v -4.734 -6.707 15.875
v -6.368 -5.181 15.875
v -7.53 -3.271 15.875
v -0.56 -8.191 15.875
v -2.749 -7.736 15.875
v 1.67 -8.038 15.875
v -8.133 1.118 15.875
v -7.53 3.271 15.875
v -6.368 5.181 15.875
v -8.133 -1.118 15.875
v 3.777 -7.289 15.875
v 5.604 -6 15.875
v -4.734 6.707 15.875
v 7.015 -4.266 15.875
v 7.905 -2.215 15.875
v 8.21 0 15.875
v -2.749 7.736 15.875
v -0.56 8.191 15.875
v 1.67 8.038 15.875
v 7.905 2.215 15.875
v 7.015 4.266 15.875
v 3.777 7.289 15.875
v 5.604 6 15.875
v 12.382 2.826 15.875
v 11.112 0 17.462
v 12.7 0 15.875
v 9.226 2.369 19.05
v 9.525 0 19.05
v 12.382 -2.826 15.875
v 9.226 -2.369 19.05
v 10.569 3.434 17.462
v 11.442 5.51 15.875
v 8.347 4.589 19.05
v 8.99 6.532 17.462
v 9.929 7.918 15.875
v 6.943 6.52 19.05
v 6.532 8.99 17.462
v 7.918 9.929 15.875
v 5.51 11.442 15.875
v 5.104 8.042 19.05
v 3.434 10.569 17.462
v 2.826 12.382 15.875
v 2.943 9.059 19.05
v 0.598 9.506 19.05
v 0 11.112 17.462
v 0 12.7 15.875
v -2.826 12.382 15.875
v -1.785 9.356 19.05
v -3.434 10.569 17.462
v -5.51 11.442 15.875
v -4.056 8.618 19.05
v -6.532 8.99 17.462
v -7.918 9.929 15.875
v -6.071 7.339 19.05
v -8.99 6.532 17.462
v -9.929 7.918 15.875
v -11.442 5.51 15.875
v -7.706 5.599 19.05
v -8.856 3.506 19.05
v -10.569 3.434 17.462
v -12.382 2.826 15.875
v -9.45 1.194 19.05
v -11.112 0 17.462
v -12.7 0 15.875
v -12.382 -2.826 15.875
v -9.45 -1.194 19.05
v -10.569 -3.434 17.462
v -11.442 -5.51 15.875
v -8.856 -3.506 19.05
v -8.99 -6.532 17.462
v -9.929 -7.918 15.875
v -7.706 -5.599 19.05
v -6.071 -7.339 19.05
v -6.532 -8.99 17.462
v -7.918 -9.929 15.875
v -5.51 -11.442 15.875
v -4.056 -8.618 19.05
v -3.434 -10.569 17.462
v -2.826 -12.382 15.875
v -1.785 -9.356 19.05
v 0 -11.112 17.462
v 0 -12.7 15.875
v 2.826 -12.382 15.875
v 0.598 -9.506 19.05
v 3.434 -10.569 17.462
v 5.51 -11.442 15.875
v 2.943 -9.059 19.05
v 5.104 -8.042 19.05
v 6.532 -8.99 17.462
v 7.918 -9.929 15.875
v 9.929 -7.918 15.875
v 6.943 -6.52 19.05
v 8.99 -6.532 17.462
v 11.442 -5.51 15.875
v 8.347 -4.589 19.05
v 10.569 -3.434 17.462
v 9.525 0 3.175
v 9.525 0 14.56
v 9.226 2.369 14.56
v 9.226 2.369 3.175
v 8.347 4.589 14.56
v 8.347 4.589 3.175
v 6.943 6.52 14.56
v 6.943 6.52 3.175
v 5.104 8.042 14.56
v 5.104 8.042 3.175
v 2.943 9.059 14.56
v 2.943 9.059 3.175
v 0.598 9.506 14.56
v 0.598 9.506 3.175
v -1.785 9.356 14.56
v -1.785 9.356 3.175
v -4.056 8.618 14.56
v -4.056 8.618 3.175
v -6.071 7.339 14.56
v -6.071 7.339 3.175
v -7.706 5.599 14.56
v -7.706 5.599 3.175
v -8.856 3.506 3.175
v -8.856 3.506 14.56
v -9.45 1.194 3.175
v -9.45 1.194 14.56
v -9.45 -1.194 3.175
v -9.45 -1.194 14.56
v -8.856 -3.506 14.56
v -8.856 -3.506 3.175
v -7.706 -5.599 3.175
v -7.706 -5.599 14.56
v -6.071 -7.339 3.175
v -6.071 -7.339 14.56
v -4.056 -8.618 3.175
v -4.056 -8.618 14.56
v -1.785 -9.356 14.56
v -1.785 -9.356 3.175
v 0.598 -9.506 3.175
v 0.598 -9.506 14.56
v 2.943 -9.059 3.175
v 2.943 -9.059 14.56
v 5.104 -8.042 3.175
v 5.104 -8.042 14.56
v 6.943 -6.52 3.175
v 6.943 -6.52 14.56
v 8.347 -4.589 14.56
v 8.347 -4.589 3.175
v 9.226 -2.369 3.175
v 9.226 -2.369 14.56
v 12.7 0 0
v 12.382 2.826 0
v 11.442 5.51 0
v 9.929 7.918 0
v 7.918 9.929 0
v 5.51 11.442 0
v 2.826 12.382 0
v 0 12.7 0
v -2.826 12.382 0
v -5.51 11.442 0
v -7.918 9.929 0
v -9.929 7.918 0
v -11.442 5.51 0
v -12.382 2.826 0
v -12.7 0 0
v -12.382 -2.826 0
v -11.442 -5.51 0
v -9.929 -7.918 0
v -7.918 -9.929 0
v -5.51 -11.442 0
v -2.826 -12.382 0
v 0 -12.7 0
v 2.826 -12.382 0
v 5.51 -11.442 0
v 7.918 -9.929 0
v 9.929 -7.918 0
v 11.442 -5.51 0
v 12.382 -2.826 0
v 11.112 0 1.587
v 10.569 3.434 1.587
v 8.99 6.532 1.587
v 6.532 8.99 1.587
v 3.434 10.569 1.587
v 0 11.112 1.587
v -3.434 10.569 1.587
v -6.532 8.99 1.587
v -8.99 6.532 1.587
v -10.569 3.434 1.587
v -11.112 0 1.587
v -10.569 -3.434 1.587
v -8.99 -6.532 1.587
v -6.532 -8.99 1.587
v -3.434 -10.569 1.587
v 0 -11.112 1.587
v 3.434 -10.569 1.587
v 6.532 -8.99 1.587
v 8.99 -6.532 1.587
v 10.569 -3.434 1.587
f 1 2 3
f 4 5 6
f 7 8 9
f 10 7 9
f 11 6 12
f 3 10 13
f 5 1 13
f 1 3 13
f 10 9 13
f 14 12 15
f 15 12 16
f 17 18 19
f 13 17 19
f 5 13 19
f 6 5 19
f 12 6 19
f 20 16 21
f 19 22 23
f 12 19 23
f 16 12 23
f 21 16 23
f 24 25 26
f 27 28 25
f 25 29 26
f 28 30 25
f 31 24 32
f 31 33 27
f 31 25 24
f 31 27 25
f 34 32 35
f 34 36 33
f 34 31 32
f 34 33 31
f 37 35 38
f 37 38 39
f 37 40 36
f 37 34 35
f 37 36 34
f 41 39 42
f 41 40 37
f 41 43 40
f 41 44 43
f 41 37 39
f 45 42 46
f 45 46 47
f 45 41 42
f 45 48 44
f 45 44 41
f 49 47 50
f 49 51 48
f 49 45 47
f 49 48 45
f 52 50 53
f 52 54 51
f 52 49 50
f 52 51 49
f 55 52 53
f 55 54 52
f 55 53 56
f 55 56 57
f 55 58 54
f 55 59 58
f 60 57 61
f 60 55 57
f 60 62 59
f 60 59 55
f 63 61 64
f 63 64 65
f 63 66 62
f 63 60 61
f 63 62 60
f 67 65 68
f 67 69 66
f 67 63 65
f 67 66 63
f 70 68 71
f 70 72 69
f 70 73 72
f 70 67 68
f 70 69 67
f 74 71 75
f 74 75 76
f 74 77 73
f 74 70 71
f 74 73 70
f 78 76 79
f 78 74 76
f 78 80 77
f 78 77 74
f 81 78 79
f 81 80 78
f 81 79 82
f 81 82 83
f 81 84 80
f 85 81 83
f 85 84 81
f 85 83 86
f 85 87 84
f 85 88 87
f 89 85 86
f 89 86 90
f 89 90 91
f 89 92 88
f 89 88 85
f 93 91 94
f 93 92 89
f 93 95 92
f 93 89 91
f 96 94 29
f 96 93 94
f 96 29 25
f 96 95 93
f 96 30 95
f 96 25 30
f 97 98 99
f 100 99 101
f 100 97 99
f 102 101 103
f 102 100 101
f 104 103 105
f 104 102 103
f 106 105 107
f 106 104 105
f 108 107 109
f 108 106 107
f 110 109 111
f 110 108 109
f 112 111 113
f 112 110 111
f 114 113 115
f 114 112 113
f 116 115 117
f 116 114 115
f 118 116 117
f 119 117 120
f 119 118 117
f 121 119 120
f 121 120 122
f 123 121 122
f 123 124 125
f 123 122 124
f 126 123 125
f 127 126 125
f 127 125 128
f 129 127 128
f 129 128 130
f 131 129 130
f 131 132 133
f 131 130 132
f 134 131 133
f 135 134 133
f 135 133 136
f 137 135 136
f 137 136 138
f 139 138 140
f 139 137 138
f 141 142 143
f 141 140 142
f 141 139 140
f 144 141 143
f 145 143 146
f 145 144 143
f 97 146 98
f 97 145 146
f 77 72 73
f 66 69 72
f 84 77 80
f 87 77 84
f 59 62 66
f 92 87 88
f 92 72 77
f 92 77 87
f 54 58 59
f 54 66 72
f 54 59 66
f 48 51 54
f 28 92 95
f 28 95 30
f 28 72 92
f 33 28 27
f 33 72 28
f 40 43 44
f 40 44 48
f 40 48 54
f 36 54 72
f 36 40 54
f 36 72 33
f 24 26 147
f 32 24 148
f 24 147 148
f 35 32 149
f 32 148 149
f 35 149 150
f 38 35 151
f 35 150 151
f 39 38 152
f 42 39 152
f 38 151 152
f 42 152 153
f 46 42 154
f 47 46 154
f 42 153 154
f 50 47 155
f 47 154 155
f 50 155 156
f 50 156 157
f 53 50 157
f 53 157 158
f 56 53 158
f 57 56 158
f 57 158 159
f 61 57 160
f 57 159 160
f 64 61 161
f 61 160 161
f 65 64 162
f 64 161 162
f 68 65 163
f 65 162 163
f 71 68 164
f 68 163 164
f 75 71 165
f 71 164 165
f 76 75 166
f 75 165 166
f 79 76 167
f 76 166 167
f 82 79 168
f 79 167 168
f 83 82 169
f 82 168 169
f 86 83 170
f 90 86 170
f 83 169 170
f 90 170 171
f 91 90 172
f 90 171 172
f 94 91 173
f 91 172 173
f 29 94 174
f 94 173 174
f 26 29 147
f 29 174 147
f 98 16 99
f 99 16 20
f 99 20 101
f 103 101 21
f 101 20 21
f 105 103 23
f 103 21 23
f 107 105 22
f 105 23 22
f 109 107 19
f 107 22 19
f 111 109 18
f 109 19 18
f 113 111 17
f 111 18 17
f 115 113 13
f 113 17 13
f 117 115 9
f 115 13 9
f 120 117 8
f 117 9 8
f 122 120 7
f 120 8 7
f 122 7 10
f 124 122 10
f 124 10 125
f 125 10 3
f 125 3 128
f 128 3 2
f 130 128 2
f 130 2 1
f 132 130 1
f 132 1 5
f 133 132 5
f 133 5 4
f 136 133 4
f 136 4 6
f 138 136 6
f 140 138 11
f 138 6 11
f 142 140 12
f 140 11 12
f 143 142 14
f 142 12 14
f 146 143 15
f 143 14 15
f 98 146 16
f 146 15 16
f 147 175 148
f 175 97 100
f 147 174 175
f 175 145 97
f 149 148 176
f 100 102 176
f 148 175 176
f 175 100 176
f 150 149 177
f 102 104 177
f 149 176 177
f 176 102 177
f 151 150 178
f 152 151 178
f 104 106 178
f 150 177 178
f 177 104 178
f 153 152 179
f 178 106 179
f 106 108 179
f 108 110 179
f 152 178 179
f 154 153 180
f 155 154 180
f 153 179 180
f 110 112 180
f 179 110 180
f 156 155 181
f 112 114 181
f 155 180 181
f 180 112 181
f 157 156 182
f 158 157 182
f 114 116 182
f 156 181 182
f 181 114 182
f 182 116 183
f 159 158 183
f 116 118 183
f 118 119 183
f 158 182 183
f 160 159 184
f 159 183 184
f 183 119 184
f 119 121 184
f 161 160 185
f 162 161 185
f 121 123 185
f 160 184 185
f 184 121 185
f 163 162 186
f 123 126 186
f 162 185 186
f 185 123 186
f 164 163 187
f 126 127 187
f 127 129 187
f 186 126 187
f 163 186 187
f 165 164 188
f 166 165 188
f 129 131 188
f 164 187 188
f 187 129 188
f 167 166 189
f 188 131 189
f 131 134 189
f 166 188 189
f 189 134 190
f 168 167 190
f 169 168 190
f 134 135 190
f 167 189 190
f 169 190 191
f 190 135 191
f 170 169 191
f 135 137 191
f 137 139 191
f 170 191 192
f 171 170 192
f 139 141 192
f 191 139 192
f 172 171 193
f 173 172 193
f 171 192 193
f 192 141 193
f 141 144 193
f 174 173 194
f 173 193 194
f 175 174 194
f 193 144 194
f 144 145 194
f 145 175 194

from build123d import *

# Parameters (mm, degrees)
F0_R     = 12.7
F1_DEPTH = 19.05
F2_SIZE  = 3.175
F3_T     = -3.175
F4_SIZE  = 3.17499


# Not quite as in the source:
# - a fillet or chamfer is up to 0.001 mm smaller than in the source, because OpenCascade refuses the exact size


with BuildPart() as f1:
    # F0 (on Top) → F1 (new body)
    with BuildSketch(Plane.XY):
        Circle(F0_R)
    extrude(amount=F1_DEPTH)

    # F2
    f2_edges = [f1.edges().sort_by_distance(p)[0] for p in [
        (-12.7, 0, 19.05),
    ]]
    chamfer(f2_edges, length=F2_SIZE)

    # F3
    f3_openings = [f1.faces().sort_by_distance(p)[0] for p in [
        (0, 0, 0),
    ]]
    offset(amount=F3_T, openings=f3_openings)

    # F4 (size 3.175 in the source; OpenCascade refuses exactly that, so slightly less here)
    f4_edges = [f1.edges().sort_by_distance(p)[0] for p in [
        (-9.525, 0, 0),
    ]]
    chamfer(f4_edges, length=F4_SIZE)


solid = f1.part
